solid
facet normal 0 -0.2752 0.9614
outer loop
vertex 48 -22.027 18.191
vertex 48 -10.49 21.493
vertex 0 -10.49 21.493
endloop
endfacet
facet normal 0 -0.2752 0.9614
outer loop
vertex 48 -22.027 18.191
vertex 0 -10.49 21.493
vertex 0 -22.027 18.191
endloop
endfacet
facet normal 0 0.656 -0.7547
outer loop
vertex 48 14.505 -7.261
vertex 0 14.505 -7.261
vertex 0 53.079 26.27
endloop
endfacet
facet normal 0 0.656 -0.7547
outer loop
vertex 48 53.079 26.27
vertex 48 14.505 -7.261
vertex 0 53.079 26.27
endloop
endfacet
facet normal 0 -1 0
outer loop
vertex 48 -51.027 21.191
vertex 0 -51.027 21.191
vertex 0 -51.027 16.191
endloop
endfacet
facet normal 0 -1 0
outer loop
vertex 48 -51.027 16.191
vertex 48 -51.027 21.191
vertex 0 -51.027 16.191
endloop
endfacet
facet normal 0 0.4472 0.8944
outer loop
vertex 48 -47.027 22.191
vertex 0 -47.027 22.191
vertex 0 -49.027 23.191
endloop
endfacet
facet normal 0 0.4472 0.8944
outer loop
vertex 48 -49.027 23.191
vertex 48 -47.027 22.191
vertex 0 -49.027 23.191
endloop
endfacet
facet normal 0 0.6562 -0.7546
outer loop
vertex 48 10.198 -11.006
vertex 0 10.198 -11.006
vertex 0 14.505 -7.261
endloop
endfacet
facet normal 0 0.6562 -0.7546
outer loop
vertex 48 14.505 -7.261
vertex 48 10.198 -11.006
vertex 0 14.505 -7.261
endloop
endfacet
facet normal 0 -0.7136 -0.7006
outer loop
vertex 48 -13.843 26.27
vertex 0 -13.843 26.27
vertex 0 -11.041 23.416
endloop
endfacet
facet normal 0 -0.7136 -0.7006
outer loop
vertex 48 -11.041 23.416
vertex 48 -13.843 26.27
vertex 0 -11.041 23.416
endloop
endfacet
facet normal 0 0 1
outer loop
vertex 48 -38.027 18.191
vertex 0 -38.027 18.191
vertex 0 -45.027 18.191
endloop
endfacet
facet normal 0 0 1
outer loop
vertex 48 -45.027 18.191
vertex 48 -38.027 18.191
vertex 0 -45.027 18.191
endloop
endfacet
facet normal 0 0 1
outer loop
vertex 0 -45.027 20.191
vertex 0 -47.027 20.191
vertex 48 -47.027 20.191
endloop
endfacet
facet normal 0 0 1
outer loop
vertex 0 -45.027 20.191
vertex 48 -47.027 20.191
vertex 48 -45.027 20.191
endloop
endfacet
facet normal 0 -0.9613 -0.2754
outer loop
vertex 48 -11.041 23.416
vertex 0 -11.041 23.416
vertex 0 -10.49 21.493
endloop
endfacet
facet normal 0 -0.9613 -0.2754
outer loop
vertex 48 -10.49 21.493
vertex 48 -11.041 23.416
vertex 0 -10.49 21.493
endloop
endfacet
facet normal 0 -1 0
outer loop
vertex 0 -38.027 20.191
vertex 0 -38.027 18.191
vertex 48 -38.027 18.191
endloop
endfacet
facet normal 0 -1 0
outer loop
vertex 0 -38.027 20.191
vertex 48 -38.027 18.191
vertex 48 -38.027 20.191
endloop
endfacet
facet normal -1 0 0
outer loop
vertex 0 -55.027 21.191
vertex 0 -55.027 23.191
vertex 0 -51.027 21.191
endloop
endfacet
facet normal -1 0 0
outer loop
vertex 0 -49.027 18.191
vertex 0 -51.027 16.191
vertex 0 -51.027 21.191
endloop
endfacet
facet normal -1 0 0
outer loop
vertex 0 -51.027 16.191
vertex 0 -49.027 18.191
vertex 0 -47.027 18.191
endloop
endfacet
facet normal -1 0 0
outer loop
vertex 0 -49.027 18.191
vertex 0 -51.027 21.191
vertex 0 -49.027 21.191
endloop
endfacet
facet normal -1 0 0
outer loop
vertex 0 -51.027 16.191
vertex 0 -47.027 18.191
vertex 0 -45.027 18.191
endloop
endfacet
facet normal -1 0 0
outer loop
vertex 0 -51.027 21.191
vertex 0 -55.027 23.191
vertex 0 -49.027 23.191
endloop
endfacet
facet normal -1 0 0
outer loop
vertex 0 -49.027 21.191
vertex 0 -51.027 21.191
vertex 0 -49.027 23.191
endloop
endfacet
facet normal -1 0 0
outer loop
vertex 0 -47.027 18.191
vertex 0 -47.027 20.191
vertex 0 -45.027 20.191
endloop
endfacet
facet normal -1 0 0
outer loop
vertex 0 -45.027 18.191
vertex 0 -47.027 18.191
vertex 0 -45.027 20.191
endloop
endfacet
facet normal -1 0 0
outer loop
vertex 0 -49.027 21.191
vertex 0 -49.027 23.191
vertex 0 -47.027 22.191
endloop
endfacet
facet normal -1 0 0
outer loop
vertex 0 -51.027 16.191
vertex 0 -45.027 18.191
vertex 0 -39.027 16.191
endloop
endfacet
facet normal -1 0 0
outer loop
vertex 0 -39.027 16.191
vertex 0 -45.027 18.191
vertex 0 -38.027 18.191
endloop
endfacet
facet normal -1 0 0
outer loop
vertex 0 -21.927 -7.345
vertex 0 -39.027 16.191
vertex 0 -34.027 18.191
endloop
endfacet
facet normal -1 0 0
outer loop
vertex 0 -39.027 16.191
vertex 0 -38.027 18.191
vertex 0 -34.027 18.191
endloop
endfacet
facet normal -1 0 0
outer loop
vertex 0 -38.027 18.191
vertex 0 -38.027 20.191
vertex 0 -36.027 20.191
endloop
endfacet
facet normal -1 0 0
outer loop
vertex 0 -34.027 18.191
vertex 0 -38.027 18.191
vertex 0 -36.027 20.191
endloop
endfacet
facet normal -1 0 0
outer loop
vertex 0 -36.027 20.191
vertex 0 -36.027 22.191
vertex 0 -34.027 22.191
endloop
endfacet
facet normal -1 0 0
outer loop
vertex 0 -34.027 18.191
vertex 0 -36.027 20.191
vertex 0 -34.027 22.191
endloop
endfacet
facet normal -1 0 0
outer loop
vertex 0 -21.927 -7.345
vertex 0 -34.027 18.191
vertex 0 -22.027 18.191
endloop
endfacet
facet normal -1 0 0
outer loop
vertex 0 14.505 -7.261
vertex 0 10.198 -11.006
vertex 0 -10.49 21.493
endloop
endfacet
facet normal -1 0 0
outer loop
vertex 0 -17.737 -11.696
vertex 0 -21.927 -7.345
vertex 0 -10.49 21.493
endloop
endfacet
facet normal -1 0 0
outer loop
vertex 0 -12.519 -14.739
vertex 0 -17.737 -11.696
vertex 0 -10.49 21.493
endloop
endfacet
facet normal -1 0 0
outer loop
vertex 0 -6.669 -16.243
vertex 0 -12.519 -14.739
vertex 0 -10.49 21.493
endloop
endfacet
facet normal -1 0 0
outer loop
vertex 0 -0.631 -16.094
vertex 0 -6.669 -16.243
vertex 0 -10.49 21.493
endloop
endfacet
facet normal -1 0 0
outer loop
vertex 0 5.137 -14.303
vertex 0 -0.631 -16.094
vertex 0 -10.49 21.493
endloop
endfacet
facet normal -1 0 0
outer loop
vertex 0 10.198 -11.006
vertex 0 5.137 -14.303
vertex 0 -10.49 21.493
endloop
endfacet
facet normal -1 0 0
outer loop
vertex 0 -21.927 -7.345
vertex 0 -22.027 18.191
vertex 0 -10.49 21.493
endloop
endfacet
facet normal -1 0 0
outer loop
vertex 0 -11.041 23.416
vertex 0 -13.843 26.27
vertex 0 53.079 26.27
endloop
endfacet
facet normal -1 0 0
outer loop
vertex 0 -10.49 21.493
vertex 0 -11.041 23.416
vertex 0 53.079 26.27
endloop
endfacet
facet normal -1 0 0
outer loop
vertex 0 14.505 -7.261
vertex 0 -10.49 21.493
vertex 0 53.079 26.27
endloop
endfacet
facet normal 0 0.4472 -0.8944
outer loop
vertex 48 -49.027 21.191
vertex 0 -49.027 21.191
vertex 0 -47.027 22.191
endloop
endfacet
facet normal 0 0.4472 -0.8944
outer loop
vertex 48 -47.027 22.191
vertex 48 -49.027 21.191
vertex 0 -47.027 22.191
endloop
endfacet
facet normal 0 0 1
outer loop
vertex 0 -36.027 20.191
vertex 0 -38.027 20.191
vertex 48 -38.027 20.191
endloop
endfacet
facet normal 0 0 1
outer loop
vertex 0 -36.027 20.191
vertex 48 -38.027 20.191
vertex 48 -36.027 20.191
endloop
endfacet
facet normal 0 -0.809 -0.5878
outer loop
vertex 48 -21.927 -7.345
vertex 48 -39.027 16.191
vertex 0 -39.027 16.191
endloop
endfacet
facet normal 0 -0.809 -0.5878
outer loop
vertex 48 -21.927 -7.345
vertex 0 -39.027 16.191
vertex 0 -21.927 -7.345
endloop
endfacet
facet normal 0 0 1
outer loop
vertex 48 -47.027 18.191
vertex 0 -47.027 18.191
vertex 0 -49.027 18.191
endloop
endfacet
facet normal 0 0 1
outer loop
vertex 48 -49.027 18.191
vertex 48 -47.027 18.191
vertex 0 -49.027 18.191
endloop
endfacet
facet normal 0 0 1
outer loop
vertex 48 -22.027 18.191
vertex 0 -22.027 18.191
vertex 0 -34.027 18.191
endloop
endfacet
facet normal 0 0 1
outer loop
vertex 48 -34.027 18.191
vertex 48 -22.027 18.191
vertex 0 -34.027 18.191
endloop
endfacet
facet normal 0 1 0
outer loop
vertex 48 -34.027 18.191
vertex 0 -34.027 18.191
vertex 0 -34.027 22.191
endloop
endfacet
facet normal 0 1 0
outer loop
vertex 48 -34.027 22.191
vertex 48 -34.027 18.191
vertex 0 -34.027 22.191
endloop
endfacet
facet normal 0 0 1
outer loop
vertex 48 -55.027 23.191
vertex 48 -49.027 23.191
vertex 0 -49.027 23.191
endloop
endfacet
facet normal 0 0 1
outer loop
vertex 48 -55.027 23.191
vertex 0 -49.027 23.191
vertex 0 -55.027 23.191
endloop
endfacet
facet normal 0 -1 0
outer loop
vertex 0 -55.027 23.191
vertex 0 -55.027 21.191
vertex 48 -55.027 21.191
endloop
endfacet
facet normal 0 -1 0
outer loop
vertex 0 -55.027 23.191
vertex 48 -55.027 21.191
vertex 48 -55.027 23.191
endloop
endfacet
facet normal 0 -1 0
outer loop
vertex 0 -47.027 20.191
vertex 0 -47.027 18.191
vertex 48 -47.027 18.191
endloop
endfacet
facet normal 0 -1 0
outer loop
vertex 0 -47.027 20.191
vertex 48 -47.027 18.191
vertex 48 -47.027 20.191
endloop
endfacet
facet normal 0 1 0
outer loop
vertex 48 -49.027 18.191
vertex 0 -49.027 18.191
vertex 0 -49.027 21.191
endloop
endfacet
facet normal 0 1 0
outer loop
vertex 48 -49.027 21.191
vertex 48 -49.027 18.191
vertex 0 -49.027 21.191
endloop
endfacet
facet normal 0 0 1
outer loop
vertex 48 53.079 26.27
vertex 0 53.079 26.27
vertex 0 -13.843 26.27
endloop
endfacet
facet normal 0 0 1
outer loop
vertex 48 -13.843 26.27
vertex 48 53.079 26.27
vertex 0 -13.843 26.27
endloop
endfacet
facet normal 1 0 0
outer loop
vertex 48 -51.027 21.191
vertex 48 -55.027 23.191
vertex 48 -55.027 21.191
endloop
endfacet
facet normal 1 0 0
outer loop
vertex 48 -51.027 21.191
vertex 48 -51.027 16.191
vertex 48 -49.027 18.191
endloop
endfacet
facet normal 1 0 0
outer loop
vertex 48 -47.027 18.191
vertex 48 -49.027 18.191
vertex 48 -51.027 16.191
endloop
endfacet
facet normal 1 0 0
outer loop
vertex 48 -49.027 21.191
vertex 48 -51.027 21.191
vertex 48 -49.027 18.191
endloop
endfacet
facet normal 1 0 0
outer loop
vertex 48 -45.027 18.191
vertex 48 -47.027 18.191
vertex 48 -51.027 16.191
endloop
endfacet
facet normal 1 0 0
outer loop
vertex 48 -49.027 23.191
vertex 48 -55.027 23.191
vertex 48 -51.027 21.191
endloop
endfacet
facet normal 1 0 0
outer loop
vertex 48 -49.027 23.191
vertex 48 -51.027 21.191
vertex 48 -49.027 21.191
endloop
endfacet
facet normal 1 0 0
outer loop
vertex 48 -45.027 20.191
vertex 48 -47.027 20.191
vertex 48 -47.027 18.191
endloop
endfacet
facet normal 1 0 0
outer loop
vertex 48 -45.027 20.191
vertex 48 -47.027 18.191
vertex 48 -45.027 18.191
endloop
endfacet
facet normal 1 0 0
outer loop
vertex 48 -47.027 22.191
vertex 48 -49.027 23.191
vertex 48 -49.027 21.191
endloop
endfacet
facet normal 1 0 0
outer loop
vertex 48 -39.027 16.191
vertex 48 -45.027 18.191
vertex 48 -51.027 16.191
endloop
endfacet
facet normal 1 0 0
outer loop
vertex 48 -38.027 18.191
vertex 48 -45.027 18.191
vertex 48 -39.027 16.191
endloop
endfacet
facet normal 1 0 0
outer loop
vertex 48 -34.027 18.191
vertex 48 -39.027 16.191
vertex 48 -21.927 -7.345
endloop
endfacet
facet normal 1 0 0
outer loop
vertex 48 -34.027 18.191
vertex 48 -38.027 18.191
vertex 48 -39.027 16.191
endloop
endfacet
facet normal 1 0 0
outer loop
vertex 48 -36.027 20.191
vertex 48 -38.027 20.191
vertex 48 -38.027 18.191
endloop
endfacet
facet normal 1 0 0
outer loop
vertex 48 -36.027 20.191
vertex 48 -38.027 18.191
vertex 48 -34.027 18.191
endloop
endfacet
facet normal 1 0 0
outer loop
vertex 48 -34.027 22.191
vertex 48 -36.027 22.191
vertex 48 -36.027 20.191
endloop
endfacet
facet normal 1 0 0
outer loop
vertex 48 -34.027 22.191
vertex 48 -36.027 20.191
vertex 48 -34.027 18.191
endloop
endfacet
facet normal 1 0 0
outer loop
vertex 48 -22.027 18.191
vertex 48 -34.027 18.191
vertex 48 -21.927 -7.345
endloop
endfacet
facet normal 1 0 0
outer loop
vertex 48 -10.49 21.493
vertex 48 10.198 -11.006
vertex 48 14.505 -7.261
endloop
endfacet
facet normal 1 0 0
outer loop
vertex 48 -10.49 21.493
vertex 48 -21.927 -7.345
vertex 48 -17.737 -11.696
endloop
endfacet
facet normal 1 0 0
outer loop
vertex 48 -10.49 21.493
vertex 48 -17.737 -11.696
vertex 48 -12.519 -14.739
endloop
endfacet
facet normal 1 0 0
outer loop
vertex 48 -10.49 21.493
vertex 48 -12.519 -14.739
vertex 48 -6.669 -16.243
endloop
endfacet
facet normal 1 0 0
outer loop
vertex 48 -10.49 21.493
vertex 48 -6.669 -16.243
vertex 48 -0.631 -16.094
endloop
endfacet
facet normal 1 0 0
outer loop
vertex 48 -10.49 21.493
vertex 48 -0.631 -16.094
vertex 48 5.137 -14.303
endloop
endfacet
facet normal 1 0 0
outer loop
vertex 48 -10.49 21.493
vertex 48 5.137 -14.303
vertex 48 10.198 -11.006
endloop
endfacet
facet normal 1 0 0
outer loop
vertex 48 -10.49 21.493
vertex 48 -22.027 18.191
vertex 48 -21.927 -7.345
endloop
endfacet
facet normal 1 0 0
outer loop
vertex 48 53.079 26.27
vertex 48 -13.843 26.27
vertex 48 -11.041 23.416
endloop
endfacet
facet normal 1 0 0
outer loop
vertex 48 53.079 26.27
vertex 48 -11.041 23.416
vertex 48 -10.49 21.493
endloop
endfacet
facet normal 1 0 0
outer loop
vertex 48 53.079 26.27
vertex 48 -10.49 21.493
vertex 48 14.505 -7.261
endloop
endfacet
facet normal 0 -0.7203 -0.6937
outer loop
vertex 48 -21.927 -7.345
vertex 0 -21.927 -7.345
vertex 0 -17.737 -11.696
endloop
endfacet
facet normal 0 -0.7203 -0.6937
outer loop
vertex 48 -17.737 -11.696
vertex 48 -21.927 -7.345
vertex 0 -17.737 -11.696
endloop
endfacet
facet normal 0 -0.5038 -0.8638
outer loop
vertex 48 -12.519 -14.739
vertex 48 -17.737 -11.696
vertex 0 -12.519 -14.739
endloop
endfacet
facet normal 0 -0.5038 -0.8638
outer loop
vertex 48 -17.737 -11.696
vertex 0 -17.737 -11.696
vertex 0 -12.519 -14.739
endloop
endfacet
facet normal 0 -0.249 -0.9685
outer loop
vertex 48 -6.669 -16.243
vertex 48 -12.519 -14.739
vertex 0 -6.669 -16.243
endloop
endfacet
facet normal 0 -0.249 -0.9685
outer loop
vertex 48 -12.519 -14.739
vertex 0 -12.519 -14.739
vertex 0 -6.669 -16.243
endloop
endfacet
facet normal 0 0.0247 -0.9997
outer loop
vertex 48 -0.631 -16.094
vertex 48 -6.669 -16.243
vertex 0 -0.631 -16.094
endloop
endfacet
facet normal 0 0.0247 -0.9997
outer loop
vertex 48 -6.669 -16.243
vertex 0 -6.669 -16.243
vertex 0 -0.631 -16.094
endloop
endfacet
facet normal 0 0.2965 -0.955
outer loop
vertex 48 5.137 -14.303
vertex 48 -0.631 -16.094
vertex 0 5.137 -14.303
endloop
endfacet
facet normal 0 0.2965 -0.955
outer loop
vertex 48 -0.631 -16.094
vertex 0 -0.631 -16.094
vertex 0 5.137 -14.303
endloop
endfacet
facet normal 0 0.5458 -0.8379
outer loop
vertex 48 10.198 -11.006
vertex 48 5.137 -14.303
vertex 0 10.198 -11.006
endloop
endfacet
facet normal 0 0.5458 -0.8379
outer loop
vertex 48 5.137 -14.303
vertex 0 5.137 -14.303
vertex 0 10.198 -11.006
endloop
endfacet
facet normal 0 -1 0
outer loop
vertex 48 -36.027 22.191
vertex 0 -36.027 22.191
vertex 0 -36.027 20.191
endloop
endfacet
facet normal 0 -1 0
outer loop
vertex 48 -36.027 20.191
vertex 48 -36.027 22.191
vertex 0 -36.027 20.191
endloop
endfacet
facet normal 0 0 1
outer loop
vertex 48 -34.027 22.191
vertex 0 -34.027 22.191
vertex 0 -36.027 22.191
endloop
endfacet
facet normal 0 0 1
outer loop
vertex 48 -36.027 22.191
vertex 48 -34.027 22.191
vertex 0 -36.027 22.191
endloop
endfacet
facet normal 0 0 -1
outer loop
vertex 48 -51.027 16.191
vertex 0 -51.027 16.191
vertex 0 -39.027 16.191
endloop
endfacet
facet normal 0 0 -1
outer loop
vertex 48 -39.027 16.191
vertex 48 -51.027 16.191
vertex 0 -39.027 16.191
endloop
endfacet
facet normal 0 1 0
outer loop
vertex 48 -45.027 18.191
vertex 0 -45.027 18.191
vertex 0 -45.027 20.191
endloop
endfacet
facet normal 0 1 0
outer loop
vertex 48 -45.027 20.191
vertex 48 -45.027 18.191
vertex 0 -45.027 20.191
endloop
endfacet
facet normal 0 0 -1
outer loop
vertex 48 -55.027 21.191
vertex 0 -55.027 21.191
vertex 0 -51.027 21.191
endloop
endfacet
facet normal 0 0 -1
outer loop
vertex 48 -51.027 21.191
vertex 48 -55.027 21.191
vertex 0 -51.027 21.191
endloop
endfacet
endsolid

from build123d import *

# Parameters (mm, degrees)
F0_W     = 2
F0_H     = 2
F0_W_2   = 4
F1_DEPTH = 48


with BuildPart() as f1:
    # F0 (on Right) → F1 (new body)
    with BuildSketch(Plane.YZ):
        with BuildLine():
            Line((10.198316, -11.005537), (14.505481, -7.261376))
            Line((14.505481, -7.261376), (-10.490369, 21.493059))
            Line((-10.490369, 21.493059), (-22.027238, 18.191447))
            Line((-22.027238, 18.191447), (-34.027238, 18.191447))
            Line((-34.027238, 18.191447), (-36.027238, 18.191447))
            Line((-36.027238, 18.191447), (-38.027238, 18.191447))
            Line((-38.027238, 18.191447), (-45.027238, 18.191447))
            Line((-45.027238, 18.191447), (-47.027238, 18.191447))
            Line((-47.027238, 18.191447), (-49.027238, 18.191447))
            Line((-49.027238, 18.191447), (-49.027238, 16.191447))
            Line((-49.027238, 16.191447), (-39.027238, 16.191447))
            Line((-39.027238, 16.191447), (-21.926756, -7.345347))
            ThreePointArc((-21.926756, -7.345347), (-6.669481, -16.243127), (10.198316, -11.005537))
        make_face()
        Polygon((53.078913, 26.269997), (-13.84313, 26.269997), (-11.040637, 23.415871), (-10.490369, 21.493059), (14.505481, -7.261376), align=None)
        Polygon((-36.027238, 18.191447), (-34.027238, 18.191447), (-34.027238, 22.191447), (-36.027238, 22.191447), (-36.027238, 20.191447), align=None)
        with Locations((-37.027238, 19.191447)):
            Rectangle(F0_W, F0_H)
        with Locations((-46.027238, 19.191447)):
            Rectangle(F0_W, F0_H)
        Polygon((-51.027238, 16.191447), (-49.027238, 16.191447), (-49.027238, 18.191447), (-49.027238, 21.191447), (-49.027238, 22.191447), (-49.027238, 23.191447), (-51.027238, 23.191447), (-51.027238, 21.191447), align=None)
        Polygon((-49.027238, 22.191447), (-49.027238, 21.191447), (-47.027238, 22.191447), align=None)
        Polygon((-49.027238, 23.191447), (-49.027238, 22.191447), (-47.027238, 22.191447), align=None)
        with Locations((-53.027238, 22.191447)):
            Rectangle(F0_W_2, F0_H)
    extrude(amount=F1_DEPTH)


solid = f1.part
